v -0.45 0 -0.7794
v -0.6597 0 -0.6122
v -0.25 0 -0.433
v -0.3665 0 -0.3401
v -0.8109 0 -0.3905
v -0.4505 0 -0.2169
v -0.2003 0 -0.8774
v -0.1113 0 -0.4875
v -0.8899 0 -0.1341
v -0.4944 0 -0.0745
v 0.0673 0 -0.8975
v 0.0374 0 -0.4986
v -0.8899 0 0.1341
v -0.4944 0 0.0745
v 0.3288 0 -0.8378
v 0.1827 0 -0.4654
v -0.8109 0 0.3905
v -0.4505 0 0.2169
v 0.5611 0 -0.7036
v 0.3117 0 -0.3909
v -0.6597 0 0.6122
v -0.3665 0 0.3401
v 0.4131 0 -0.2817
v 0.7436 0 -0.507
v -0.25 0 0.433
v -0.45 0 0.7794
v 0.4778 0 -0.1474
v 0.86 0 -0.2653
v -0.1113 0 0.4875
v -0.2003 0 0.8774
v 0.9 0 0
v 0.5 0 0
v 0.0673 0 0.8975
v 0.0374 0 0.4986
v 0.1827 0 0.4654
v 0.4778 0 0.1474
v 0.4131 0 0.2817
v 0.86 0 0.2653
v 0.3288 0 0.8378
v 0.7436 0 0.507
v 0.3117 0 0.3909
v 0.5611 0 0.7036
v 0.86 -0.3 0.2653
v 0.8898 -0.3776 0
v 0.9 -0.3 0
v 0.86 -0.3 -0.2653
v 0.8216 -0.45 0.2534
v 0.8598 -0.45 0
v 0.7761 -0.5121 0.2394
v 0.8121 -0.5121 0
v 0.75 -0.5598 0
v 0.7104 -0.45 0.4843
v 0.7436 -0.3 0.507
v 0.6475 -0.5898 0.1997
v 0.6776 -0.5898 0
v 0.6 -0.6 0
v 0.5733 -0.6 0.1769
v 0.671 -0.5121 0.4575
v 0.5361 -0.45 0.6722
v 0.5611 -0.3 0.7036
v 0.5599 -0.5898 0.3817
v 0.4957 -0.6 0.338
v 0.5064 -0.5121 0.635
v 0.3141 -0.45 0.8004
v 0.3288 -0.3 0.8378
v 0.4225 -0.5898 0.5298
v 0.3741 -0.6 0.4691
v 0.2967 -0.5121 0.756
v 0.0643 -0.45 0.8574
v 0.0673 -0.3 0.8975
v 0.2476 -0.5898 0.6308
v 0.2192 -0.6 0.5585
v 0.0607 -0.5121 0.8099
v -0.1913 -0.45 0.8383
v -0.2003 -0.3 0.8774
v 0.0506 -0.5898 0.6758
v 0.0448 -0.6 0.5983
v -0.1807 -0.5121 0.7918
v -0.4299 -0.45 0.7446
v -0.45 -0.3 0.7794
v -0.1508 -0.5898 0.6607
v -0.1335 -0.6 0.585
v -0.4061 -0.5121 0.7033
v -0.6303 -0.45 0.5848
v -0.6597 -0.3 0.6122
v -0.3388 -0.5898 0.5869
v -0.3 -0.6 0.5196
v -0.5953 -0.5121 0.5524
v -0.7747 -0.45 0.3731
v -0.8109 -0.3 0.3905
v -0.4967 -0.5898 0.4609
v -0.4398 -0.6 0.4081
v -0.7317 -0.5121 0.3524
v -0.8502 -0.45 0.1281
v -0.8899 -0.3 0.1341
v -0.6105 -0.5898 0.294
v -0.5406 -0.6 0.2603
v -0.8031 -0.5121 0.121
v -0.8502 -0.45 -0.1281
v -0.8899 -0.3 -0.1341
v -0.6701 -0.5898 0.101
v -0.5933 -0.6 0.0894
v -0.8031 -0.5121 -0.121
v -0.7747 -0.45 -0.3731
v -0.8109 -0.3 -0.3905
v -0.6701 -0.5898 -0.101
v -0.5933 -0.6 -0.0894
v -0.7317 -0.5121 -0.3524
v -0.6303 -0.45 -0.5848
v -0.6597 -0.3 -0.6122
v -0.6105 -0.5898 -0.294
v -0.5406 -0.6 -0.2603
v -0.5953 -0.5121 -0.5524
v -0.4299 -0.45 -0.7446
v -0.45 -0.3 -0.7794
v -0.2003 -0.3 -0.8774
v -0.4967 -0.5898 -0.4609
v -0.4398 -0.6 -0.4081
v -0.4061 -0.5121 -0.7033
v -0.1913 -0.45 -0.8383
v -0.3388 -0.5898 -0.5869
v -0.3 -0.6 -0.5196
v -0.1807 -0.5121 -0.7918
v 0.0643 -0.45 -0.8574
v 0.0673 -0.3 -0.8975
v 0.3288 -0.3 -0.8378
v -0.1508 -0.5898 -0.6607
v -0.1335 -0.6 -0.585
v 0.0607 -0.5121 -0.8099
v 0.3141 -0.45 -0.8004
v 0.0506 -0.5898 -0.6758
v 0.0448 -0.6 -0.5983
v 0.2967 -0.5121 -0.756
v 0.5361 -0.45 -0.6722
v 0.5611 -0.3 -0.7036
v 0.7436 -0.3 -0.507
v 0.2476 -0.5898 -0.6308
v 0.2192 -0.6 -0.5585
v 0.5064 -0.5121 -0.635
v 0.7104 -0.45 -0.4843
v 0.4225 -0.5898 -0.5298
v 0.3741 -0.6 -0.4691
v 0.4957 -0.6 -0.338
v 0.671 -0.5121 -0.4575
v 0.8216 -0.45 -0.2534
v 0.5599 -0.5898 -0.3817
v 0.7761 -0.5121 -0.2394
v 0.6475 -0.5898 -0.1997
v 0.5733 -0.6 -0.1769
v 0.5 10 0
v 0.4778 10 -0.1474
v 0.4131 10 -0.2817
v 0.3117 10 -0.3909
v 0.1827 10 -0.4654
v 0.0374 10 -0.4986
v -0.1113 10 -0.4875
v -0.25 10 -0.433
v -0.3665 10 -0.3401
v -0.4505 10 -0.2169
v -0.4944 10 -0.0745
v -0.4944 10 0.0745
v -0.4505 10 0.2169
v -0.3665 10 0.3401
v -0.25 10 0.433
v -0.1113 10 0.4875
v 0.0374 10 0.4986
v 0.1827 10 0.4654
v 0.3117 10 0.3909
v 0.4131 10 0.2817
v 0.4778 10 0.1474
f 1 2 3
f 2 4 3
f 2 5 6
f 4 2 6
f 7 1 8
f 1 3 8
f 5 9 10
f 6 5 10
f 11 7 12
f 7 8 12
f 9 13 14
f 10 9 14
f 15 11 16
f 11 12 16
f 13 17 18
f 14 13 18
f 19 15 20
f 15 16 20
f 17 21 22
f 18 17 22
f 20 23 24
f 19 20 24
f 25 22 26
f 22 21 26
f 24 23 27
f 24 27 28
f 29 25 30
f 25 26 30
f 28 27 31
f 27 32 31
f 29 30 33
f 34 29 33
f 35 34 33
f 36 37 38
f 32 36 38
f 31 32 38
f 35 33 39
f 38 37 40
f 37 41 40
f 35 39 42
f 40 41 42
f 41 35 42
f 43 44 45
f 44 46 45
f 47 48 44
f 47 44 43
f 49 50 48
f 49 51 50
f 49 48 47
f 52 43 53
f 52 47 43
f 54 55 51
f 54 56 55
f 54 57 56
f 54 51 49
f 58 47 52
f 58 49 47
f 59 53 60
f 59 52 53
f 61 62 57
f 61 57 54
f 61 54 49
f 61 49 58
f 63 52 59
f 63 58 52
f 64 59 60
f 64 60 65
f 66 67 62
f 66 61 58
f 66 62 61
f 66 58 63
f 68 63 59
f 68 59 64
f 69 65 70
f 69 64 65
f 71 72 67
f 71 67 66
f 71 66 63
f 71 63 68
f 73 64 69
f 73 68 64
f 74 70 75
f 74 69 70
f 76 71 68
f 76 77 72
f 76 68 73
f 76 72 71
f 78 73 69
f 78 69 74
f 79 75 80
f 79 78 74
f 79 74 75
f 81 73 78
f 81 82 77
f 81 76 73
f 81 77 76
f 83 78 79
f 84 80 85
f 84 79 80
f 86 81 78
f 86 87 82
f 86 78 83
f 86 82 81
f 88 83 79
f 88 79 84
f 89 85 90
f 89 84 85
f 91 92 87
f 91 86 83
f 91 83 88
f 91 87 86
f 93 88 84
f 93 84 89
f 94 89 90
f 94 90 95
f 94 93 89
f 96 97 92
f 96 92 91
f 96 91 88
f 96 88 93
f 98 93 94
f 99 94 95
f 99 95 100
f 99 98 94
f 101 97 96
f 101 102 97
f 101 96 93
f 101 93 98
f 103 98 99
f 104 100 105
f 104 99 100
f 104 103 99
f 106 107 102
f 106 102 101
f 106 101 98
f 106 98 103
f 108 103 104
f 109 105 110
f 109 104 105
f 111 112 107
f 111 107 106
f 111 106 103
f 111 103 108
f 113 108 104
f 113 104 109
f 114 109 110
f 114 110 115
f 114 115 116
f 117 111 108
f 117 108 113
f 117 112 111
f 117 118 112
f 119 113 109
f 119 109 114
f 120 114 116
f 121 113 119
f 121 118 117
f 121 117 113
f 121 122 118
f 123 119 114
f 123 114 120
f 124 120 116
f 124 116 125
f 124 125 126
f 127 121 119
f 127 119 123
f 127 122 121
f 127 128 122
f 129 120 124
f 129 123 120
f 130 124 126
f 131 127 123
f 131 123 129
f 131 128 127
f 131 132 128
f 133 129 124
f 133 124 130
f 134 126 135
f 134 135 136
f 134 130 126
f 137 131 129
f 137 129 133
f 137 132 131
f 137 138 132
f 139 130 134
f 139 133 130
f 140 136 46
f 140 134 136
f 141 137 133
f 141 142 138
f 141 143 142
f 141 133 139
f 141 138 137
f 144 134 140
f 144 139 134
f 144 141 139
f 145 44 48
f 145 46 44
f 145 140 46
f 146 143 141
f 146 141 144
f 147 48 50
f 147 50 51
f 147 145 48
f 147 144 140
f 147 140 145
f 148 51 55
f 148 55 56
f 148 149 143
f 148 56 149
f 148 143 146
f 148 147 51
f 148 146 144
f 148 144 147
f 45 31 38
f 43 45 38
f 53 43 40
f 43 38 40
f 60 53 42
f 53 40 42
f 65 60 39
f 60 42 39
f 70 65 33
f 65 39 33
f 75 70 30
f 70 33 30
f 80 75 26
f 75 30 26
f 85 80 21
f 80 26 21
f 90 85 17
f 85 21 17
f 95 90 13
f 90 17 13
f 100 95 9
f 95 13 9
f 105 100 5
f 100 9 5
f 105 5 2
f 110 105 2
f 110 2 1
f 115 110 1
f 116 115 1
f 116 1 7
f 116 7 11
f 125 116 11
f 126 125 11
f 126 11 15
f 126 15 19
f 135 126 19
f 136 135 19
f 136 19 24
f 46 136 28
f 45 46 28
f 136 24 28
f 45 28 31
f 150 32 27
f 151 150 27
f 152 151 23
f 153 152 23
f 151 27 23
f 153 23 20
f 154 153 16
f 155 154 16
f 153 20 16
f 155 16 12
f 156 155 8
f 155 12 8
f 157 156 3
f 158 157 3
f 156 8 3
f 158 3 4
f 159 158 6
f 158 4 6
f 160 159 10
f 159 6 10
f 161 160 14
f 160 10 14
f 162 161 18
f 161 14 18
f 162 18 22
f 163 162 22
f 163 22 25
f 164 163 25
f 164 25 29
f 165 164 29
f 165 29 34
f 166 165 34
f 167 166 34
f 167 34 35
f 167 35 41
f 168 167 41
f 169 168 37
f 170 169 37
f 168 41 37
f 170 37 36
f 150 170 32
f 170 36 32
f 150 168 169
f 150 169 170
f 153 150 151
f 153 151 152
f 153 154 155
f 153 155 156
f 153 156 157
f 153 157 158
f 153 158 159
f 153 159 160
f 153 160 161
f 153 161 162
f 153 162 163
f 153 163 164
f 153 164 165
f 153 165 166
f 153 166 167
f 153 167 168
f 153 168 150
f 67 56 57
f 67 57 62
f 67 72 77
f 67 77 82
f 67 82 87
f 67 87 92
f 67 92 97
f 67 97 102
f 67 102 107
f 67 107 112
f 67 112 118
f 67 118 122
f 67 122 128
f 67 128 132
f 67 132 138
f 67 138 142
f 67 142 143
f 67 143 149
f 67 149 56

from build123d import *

# Parameters (mm, degrees)
SKETCH1_R           = 0.5
BOSS_EXTRUDE1_DEPTH = 10
SKETCH2_R           = 0.9
BOSS_EXTRUDE2_DEPTH = 0.6
FILLET1_R           = 0.3


with BuildPart() as part:
    # Sketch1 → Boss-Extrude1 (new body)
    with BuildSketch(Plane(origin=(0, 0, 0), x_dir=(1, 0, 0), z_dir=(0, 1, 0))):
        Circle(SKETCH1_R)
    extrude(amount=BOSS_EXTRUDE1_DEPTH)

    # Sketch2 → Boss-Extrude2 (add)
    with BuildSketch(Plane.XZ):
        Circle(SKETCH2_R)
    extrude(amount=BOSS_EXTRUDE2_DEPTH)

    # Fillet1
    fillet1_edges = [part.edges().sort_by_distance(p)[0] for p in [
        (-0.9, -0.6, 0),
    ]]
    fillet(fillet1_edges, radius=FILLET1_R)


solid = part.part
